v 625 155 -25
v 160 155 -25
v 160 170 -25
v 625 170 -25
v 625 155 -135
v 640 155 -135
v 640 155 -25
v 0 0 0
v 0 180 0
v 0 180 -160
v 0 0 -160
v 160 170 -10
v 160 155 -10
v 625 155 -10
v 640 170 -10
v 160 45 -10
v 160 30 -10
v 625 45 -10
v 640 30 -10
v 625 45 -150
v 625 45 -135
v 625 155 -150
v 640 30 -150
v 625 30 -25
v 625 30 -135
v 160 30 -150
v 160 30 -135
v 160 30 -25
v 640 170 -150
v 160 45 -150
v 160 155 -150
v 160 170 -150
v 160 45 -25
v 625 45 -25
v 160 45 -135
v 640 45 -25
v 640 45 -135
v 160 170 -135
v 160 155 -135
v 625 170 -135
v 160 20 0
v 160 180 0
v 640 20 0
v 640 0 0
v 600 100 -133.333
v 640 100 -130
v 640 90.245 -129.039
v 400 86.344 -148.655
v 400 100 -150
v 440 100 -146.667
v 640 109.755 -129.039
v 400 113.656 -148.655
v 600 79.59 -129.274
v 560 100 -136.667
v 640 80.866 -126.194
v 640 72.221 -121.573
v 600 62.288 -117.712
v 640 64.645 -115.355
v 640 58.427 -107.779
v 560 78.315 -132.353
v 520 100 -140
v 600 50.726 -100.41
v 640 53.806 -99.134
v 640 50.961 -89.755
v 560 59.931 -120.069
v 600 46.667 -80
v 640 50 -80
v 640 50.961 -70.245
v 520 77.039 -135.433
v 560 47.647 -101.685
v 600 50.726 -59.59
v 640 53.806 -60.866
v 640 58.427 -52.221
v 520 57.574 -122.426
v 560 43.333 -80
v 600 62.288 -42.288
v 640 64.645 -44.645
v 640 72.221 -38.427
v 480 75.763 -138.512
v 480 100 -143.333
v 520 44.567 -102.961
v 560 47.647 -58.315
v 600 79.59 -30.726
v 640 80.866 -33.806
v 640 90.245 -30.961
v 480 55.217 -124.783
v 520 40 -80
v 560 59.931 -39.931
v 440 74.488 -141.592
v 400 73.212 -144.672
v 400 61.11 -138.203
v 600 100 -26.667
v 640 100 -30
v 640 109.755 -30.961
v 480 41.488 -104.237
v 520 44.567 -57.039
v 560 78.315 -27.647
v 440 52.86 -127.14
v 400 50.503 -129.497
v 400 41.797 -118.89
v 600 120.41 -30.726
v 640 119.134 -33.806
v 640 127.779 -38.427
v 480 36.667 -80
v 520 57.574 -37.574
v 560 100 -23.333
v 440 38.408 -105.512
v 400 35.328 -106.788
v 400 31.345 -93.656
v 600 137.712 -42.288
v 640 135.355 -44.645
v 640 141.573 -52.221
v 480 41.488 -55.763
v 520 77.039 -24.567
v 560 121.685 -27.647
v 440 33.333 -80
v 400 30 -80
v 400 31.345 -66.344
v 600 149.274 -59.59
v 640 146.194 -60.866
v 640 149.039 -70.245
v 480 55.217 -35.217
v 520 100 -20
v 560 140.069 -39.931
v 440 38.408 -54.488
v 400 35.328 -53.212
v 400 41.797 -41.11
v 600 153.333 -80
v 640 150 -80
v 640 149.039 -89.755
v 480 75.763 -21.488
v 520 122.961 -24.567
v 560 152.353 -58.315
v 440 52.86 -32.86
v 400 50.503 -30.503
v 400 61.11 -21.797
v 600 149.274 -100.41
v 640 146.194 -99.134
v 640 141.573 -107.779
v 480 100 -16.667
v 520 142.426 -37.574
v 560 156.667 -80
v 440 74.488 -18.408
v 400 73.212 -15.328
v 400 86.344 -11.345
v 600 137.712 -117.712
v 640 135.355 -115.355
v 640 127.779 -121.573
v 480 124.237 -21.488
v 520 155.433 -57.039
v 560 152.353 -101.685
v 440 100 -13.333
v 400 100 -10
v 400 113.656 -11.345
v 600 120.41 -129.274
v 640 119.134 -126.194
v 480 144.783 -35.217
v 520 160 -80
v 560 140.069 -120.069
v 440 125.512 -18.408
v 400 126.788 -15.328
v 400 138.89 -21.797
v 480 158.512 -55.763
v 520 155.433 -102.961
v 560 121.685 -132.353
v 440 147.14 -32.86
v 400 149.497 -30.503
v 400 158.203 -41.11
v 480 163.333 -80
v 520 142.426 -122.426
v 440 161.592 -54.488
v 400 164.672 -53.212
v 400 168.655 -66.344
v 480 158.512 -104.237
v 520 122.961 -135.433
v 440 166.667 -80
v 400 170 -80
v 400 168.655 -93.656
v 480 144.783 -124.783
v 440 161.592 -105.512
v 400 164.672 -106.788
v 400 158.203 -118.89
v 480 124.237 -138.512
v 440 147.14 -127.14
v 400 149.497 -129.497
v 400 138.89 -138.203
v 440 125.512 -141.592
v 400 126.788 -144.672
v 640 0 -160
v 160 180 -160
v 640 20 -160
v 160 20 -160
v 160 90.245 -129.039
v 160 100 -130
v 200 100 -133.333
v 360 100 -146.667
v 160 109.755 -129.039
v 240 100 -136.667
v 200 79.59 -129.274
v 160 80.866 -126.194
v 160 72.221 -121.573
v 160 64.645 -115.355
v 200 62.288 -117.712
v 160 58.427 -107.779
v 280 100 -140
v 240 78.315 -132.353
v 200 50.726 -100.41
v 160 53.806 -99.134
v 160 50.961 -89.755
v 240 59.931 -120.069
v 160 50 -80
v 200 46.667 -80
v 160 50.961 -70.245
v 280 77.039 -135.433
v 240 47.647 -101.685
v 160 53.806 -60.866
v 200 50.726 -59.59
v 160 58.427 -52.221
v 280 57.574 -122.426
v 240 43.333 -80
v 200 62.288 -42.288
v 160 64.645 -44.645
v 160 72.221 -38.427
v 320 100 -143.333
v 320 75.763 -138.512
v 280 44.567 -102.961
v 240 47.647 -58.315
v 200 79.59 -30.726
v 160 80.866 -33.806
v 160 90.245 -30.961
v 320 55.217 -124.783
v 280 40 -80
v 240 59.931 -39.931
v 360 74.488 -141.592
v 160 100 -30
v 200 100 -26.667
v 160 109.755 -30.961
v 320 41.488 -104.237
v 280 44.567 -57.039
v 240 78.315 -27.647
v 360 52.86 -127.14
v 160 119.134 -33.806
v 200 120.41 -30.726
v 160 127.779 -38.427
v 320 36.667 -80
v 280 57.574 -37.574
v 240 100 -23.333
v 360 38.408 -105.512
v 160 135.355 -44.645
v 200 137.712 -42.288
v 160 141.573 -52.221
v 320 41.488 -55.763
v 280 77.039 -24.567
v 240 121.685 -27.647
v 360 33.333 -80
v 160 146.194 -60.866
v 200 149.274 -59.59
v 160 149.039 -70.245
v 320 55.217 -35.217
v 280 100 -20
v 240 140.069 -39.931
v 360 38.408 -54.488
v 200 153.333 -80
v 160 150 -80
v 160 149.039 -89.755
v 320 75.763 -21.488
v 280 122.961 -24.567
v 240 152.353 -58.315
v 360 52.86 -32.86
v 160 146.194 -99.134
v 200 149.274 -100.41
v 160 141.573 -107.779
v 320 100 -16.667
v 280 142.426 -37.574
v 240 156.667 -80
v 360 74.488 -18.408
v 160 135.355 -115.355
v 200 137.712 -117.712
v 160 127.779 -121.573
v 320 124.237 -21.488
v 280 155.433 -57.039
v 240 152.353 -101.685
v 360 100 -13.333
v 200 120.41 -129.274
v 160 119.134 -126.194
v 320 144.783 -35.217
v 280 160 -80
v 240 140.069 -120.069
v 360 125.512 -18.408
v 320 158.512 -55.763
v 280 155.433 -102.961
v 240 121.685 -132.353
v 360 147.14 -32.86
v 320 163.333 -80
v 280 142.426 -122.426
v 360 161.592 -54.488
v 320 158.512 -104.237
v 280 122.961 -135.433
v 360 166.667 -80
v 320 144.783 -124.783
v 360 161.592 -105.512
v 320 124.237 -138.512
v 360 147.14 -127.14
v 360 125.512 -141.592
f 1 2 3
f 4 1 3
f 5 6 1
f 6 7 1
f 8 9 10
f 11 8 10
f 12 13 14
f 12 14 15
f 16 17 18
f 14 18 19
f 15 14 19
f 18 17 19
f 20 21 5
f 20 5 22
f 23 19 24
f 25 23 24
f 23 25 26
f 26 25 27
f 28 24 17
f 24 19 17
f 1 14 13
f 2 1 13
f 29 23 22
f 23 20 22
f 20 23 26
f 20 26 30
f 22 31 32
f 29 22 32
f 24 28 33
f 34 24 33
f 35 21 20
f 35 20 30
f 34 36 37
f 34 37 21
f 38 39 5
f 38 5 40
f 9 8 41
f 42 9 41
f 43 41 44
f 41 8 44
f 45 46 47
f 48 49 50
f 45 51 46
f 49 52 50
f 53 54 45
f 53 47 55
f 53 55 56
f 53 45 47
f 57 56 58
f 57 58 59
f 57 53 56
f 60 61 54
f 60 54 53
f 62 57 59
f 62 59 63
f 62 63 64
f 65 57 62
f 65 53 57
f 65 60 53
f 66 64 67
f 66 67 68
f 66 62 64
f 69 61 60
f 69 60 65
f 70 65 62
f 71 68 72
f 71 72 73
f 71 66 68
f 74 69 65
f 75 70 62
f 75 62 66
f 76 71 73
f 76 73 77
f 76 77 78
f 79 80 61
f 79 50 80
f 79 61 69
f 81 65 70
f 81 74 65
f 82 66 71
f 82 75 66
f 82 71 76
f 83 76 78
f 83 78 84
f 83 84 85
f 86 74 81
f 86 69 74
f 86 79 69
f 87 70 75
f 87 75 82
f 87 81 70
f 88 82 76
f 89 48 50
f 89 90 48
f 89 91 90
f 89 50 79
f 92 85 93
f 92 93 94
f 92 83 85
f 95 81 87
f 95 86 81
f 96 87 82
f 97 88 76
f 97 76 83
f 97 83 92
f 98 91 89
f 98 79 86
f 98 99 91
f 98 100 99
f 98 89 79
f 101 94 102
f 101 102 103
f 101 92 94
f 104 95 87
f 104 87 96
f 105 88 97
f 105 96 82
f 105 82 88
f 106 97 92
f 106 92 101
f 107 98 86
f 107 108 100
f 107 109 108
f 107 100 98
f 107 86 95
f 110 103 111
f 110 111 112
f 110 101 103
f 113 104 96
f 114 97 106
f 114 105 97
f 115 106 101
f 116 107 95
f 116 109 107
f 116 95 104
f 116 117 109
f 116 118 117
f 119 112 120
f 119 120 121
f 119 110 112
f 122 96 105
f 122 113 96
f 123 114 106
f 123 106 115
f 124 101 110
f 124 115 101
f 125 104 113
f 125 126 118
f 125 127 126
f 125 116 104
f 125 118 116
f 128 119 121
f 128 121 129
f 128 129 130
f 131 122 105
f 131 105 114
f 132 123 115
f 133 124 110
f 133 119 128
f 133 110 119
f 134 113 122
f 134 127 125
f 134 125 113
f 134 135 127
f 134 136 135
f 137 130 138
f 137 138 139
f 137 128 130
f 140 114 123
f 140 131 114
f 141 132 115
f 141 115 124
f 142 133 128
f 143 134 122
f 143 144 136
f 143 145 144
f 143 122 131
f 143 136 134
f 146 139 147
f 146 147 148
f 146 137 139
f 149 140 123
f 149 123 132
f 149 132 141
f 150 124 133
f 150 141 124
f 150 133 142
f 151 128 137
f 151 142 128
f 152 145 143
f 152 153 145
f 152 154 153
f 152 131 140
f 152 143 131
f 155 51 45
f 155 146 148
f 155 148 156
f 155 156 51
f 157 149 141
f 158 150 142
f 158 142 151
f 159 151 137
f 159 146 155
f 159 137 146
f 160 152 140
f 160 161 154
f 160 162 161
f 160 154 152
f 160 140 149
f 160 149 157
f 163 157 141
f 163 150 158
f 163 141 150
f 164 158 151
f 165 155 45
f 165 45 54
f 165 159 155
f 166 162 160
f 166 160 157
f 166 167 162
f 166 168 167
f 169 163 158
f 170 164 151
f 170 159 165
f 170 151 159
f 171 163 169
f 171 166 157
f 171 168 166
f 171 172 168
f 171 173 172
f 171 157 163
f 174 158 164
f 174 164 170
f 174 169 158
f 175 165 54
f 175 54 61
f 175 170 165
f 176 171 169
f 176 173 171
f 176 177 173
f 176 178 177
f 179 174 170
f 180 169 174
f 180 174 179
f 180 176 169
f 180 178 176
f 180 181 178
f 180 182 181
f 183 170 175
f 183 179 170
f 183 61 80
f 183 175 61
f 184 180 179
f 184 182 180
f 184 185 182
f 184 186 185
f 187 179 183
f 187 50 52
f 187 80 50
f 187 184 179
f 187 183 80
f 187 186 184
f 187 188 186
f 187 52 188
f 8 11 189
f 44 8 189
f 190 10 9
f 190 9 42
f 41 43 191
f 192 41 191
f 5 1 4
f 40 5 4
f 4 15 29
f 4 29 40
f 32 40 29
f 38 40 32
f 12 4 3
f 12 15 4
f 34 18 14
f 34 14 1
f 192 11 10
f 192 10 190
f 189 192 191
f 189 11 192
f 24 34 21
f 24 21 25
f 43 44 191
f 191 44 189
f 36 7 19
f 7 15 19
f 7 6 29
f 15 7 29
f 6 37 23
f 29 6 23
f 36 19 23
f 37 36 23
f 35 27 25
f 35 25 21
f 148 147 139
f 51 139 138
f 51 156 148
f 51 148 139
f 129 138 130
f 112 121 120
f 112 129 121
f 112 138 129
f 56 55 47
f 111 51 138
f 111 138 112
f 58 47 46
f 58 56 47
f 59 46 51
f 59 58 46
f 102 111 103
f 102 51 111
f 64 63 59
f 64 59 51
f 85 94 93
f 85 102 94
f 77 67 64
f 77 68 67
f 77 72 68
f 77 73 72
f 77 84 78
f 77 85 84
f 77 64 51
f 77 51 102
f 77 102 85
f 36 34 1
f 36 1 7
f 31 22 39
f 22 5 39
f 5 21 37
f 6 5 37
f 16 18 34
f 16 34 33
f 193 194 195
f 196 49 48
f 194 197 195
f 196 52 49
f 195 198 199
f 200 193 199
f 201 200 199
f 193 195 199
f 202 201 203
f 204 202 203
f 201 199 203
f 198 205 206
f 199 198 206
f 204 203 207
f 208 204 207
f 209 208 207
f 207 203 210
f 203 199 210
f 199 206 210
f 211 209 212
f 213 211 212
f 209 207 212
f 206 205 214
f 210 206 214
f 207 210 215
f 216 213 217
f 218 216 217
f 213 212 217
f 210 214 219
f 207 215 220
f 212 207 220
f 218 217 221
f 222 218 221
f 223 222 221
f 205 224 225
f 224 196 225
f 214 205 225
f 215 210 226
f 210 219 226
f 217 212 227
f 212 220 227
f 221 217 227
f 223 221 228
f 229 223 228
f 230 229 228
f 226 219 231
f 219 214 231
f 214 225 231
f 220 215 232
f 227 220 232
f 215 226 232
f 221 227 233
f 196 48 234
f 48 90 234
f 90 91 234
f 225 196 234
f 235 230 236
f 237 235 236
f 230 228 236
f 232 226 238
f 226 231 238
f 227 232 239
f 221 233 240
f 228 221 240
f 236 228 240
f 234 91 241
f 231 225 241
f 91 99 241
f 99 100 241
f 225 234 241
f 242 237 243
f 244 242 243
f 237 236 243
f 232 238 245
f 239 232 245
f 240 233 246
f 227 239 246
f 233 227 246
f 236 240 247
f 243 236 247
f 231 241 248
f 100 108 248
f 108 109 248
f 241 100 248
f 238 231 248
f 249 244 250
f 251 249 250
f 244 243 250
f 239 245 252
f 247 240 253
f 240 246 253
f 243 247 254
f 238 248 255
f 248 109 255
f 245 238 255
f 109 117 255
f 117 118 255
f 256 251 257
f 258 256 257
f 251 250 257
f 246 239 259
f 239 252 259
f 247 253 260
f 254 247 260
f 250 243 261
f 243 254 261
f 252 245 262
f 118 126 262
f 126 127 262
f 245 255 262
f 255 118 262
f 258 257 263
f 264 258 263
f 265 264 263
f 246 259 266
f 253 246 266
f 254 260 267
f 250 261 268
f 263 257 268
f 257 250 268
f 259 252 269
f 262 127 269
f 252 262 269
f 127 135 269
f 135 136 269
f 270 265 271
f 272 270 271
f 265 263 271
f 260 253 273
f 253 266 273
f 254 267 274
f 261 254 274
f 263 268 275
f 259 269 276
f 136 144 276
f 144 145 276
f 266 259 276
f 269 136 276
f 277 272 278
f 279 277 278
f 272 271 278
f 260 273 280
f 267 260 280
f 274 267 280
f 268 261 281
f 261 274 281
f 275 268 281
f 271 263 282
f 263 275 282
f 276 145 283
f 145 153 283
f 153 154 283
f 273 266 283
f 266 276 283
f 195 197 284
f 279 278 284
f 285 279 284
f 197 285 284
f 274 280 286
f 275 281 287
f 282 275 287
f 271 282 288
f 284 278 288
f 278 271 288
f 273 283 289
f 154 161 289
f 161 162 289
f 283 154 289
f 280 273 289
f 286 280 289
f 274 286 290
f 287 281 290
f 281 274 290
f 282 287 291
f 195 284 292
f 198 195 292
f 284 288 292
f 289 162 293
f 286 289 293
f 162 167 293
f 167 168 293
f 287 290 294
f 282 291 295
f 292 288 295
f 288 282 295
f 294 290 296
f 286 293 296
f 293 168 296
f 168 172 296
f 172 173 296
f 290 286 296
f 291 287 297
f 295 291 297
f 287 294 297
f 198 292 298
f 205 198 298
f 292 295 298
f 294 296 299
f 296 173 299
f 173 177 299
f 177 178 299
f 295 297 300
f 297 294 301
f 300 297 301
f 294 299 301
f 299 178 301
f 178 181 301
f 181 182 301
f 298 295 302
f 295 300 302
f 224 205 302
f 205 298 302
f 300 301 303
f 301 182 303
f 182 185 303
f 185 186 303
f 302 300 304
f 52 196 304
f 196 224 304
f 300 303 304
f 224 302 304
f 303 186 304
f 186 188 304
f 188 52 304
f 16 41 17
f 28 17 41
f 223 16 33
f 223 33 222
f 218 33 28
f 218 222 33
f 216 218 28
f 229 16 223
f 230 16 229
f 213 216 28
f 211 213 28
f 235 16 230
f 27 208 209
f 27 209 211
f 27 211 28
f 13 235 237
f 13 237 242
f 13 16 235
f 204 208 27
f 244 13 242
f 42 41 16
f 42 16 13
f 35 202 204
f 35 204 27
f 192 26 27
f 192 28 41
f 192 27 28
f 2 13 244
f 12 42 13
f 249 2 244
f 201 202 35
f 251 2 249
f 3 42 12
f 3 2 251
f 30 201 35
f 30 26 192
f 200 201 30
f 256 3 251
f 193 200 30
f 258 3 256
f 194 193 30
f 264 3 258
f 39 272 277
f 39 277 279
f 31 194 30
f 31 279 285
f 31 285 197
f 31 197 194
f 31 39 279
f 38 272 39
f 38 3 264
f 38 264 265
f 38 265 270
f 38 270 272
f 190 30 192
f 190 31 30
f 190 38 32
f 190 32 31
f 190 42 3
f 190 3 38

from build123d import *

# Parameters (mm, degrees)
SKETCH1_W           = 640
SKETCH1_H           = 160
BOSS_EXTRUDE1_DEPTH = 180
SKETCH2_W           = 160
SKETCH2_H           = 160
CUT_EXTRUDE1_DEPTH  = 480
SKETCH3_R           = 70
BOSS_EXTRUDE2_DEPTH = 480
SKETCH4_W           = 15
SKETCH4_H           = 15
BOSS_EXTRUDE3_DEPTH = 480
SKETCH7_W           = 15
SKETCH7_H           = 15
BOSS_EXTRUDE4_DEPTH = 110
SKETCH8_W           = 15
SKETCH8_H           = 15
BOSS_EXTRUDE5_DEPTH = 110


with BuildPart() as part:
    # Sketch1 → Boss-Extrude1 (new body)
    with BuildSketch(Plane(origin=(0, 0, 0), x_dir=(1, 0, 0), z_dir=(0, 1, 0))):
        with Locations((320, 80)):
            Rectangle(SKETCH1_W, SKETCH1_H)
    extrude(amount=BOSS_EXTRUDE1_DEPTH)

    # Sketch2 → Cut-Extrude1 (cut)
    with BuildSketch(Plane(origin=(640, 0, 0), x_dir=(0, 0, -1), z_dir=(1, 0, 0))):
        with Locations((80, 100)):
            Rectangle(SKETCH2_W, SKETCH2_H)
    extrude(amount=-CUT_EXTRUDE1_DEPTH, mode=Mode.SUBTRACT)

    # Sketch3 → Boss-Extrude2 (add)
    with BuildSketch(Plane(origin=(160, 0, 0), x_dir=(0, 0, -1), z_dir=(1, 0, 0))):
        with Locations(Location((80, 100, 0), (0, 0, 180))):
            Circle(SKETCH3_R)
    extrude(amount=BOSS_EXTRUDE2_DEPTH)

    # Sketch6 → Cut-Revolve1 (revolve, cut)
    with BuildSketch(Plane.XY.offset(-80), mode=Mode.PRIVATE) as cut_revolve1_sk:
        Polygon((160, 170), (160, 150), (400, 170), align=None)
        Polygon((640, 150), (400, 170), (640, 170), align=None)
    revolve(cut_revolve1_sk.sketch.rotate(Axis((640, 100, -80), (-1, 0, 0)), 90), axis=Axis((640, 100, -80), (-1, 0, 0)), mode=Mode.SUBTRACT)

    # Sketch4 → Boss-Extrude3 (add)
    with BuildSketch(Plane(origin=(160, 0, 0), x_dir=(0, 0, -1), z_dir=(1, 0, 0))):
        with Locations((17.5, 162.5)):
            Rectangle(SKETCH4_W, SKETCH4_H)
        with Locations((142.5, 162.5)):
            Rectangle(SKETCH4_W, SKETCH4_H)
        with Locations((142.5, 37.5)):
            Rectangle(SKETCH4_W, SKETCH4_H)
        with Locations((17.5, 37.5)):
            Rectangle(SKETCH4_W, SKETCH4_H)
    extrude(amount=BOSS_EXTRUDE3_DEPTH)

    # Sketch7 → Boss-Extrude4 (add)
    with BuildSketch(Plane(origin=(0, 0, -25), x_dir=(-1, 0, 0), z_dir=(0, 0, -1))):
        with Locations((-632.5, 162.5)):
            Rectangle(SKETCH7_W, SKETCH7_H)
    boss_extrude4 = extrude(amount=BOSS_EXTRUDE4_DEPTH)

    # Mirror1: Boss-Extrude4 across plane
    add(boss_extrude4.mirror(Plane.ZX.offset(100)))

    # Sketch8 → Boss-Extrude5 (add)
    with BuildSketch(Plane(origin=(0, 45, 0), x_dir=(1, 0, 0), z_dir=(0, 1, 0))):
        with Locations((632.5, 17.5)):
            Rectangle(SKETCH8_W, SKETCH8_H)
        with Locations((632.5, 142.5)):
            Rectangle(SKETCH8_W, SKETCH8_H)
    extrude(amount=BOSS_EXTRUDE5_DEPTH)


solid = part.part
